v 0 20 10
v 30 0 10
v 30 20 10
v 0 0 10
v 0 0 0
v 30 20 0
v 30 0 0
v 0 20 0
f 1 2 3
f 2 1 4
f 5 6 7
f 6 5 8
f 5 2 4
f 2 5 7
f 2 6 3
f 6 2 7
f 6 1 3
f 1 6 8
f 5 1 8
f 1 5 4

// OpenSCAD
// Unit of length: Unit.MM
cube(size = [30.0, 20.0, 10.0], center = false);
